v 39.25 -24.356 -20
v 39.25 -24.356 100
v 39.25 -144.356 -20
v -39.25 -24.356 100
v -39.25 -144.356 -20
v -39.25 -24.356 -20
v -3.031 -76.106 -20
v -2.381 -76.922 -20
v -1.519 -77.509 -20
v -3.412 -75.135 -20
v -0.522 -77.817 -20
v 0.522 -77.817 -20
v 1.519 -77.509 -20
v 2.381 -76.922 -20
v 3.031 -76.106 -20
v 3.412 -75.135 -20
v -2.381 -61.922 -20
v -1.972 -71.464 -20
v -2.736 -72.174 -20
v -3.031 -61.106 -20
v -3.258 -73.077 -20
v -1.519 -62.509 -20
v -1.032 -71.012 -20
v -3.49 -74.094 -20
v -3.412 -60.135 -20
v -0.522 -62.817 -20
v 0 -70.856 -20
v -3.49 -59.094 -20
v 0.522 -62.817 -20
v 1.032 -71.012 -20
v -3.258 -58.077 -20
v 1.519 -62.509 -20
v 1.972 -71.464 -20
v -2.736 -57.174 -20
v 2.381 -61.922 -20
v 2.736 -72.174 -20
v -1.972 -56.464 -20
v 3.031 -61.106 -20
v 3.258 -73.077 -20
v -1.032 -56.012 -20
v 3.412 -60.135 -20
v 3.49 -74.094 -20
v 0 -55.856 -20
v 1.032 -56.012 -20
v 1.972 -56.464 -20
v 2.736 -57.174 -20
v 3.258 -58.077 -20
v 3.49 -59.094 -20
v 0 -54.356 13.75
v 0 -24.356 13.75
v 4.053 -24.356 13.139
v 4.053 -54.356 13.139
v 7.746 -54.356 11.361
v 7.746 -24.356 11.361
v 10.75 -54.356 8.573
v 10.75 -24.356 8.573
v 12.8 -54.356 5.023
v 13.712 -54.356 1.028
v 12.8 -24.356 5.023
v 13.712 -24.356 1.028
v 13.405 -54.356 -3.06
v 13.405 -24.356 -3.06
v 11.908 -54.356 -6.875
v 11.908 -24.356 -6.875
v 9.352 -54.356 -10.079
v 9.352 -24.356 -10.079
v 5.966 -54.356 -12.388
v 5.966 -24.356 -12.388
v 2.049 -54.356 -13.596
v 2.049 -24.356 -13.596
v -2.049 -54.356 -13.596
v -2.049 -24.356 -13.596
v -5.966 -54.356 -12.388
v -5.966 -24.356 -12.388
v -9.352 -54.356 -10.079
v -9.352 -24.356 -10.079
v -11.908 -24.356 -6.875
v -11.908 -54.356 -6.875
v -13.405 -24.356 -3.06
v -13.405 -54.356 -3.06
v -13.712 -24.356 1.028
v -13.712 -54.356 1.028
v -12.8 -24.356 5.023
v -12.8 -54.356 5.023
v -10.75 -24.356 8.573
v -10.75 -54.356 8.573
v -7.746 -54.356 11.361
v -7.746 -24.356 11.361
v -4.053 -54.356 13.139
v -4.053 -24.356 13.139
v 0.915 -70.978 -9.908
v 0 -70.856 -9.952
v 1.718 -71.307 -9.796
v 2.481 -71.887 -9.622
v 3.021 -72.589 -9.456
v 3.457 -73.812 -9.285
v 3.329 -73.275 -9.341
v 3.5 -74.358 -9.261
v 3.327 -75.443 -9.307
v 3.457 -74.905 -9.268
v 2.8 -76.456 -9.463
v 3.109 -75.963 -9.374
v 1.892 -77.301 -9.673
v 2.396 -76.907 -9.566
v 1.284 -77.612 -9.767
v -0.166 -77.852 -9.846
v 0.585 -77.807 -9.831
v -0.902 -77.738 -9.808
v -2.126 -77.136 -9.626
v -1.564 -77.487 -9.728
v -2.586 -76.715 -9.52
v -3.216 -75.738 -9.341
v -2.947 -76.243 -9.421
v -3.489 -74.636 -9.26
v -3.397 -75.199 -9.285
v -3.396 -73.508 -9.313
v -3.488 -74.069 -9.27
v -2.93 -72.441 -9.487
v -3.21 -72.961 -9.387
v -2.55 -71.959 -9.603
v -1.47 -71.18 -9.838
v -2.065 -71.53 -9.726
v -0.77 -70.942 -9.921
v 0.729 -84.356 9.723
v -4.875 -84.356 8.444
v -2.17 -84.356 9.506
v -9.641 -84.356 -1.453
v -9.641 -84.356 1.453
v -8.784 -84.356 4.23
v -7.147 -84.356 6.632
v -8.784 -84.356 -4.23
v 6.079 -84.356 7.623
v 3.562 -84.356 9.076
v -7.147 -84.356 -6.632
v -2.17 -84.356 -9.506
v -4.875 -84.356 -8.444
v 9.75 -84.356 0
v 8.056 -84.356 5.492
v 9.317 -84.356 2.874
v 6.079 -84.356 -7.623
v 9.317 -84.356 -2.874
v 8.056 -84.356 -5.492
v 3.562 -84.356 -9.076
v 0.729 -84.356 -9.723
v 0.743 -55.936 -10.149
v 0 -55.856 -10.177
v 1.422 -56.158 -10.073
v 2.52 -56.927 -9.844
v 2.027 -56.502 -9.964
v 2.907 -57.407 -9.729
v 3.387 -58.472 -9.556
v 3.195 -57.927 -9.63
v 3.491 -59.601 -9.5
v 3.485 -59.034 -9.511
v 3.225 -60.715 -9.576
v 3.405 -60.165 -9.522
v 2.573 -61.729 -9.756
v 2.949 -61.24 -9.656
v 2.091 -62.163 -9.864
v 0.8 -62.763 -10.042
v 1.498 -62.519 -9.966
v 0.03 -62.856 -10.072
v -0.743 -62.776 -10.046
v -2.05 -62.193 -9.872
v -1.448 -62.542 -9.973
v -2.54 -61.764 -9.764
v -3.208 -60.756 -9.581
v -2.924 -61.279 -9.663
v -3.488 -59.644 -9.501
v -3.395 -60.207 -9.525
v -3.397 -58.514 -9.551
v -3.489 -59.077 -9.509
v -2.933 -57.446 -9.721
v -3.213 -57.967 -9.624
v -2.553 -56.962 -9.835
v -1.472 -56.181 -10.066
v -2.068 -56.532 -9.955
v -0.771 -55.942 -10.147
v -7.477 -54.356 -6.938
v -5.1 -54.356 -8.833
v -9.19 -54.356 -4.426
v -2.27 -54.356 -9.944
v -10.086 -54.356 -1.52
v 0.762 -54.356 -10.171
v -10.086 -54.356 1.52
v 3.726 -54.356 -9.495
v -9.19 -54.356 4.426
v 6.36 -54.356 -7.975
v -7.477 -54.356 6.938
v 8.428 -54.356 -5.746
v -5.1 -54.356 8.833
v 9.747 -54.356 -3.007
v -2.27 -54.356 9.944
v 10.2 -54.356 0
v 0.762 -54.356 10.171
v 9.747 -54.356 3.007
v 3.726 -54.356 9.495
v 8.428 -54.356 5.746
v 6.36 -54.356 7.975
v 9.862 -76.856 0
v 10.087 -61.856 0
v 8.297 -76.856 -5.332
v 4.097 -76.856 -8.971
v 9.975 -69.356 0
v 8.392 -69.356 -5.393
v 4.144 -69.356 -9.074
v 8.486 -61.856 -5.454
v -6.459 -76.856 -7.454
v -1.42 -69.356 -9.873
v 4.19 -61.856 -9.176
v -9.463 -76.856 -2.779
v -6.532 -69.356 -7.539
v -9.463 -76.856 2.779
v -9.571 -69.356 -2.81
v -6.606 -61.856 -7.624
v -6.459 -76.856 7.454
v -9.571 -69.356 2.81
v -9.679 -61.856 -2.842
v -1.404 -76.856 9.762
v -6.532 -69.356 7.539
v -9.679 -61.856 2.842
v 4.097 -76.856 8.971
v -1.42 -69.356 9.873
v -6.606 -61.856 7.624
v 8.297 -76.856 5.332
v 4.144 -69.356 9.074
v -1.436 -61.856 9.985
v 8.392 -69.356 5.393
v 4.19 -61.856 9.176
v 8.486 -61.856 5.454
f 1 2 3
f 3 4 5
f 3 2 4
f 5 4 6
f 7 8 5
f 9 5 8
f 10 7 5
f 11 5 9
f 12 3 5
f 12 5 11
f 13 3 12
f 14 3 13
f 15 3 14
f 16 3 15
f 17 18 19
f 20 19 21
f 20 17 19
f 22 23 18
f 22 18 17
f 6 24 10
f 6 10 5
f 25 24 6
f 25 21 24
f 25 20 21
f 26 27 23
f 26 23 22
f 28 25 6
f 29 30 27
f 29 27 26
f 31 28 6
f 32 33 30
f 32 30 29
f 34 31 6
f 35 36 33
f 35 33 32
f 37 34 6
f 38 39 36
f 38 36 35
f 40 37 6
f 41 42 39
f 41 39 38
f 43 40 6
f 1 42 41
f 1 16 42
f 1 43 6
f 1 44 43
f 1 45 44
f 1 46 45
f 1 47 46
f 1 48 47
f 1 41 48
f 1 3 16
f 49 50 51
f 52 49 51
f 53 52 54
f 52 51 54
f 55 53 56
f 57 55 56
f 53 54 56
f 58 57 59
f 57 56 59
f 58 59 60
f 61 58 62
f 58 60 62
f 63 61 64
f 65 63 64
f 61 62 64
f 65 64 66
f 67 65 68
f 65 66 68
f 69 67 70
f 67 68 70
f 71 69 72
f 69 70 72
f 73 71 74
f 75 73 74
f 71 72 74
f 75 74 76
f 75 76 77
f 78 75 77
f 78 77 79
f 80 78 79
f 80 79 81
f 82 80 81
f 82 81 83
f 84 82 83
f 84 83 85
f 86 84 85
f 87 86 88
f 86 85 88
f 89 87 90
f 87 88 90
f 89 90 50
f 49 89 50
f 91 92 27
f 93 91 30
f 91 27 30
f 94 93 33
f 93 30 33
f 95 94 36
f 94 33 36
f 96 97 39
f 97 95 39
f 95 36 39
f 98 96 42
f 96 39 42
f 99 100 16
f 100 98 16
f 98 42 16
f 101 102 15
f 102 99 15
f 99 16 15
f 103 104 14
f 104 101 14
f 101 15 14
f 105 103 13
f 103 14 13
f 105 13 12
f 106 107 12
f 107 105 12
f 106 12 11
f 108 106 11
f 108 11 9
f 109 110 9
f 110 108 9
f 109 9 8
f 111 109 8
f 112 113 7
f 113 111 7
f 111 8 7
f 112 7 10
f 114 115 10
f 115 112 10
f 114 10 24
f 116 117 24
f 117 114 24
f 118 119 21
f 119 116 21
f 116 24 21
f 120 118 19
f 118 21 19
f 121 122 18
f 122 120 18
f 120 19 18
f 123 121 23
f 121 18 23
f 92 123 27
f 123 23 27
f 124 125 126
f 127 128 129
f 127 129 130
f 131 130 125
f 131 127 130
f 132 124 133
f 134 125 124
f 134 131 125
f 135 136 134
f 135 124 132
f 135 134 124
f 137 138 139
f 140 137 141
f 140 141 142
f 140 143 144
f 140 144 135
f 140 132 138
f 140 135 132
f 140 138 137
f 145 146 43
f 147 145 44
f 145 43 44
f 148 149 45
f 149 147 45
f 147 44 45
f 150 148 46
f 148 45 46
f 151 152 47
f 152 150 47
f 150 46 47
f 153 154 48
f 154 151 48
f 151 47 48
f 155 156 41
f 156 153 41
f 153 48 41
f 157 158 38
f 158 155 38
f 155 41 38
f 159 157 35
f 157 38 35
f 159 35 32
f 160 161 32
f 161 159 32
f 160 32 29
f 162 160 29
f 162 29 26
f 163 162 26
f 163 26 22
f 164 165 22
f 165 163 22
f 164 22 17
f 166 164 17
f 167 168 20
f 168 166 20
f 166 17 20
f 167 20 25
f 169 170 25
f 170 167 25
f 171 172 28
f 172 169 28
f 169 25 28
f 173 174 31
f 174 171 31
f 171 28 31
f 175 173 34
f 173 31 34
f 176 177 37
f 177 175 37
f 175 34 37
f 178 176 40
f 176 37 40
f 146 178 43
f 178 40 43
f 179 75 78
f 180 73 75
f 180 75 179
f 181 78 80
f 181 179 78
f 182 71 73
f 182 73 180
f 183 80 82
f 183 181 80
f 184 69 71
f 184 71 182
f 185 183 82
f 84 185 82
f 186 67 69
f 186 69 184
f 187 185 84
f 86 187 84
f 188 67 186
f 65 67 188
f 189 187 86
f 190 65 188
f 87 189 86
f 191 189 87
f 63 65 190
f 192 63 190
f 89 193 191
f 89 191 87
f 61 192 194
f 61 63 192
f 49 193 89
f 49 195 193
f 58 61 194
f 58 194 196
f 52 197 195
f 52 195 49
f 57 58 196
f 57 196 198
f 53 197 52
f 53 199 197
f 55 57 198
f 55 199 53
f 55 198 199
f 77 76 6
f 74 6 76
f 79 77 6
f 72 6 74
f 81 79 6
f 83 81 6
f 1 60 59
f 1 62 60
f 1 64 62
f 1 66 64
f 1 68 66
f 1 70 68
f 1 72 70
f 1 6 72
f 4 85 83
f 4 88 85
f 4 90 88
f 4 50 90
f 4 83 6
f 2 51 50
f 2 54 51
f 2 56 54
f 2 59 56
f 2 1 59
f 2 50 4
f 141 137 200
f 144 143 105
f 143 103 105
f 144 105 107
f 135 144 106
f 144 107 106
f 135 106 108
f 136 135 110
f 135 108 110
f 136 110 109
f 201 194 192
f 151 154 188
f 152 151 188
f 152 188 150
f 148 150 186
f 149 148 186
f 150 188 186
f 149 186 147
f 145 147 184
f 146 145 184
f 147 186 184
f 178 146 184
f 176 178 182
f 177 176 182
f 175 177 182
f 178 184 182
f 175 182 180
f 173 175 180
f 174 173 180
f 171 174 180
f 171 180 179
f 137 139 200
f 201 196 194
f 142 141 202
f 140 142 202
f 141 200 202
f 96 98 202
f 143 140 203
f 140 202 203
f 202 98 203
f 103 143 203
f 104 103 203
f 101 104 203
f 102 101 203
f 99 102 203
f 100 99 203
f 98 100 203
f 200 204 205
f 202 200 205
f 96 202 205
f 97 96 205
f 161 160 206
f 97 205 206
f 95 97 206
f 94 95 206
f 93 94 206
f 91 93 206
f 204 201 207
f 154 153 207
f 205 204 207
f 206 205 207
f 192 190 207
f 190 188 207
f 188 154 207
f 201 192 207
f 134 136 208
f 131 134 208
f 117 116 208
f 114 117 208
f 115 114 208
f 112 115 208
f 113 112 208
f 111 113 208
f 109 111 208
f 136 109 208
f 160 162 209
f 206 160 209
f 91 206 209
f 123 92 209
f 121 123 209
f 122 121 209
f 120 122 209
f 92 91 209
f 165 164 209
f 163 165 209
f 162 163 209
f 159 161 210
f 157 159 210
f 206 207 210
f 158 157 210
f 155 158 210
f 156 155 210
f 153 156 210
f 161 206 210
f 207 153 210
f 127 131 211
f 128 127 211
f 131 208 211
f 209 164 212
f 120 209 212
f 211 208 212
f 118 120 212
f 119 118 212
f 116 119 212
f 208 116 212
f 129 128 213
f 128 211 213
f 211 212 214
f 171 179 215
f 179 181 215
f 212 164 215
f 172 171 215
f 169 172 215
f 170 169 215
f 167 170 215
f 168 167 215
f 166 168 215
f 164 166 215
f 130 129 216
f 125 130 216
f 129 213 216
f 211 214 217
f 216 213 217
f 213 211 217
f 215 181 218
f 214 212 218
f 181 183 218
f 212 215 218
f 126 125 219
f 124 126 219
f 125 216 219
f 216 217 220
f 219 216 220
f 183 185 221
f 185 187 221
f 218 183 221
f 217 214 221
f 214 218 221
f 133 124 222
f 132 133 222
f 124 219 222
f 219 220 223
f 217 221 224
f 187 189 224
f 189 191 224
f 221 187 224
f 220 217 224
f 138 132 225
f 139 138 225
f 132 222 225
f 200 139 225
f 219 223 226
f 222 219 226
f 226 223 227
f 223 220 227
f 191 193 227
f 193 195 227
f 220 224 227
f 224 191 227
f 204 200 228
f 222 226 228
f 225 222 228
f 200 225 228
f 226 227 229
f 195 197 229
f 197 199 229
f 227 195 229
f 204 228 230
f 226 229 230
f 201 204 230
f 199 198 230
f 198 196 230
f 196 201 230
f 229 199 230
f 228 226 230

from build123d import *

# Parameters (mm, degrees)
BOSS_EXTRUDE1_DEPTH = 39.25
SKETCH4_R           = 13.75
CUT_EXTRUDE1_DEPTH  = 30
SKETCH7_R           = 9.75
SKETCH6_R           = 10.2
SKETCH5_R           = 3.5
CUT_EXTRUDE2_DEPTH  = 15


with BuildPart() as part:
    # Sketch2 → Boss-Extrude1 (new, symmetric)
    with BuildSketch(Plane(origin=(0, 0, 0), x_dir=(0, 0, -1), z_dir=(1, 0, 0))):
        Polygon((-100, -24.35604681), (20, -144.35604681), (20, -24.35604681), align=None)
    extrude(amount=BOSS_EXTRUDE1_DEPTH, both=True)

    # Sketch4 → Cut-Extrude1 (cut)
    with BuildSketch(Plane(origin=(0, -24.35604681, 0), x_dir=(1, 0, 0), z_dir=(0, 1, 0))):
        with Locations(Location((0, 0, 0), (0, 0, 270))):
            Circle(SKETCH4_R)
    extrude(amount=-CUT_EXTRUDE1_DEPTH, mode=Mode.SUBTRACT)

    # Sketch7 → Cut-Loft1 section 0
    with BuildSketch(Plane(origin=(0, -84.35604681, 0), x_dir=(1, 0, 0), z_dir=(0, 1, 0))):
        Circle(SKETCH7_R)
    # Sketch6 → Cut-Loft1 section 1
    with BuildSketch(Plane(origin=(0, -54.35604681, 0), x_dir=(1, 0, 0), z_dir=(0, 1, 0))):
        Circle(SKETCH6_R)
    loft(mode=Mode.SUBTRACT)

    # Sketch5 → Cut-Extrude2 (cut)
    with BuildSketch(Plane(origin=(0, 0, -20), x_dir=(-1, 0, 0), z_dir=(0, 0, -1))):
        with Locations(Location((0, -59.35604681, 0), (0, 0, 90))):
            Circle(SKETCH5_R)
        with Locations(Location((0, -74.35604681, 0), (0, 0, 90))):
            Circle(SKETCH5_R)
    extrude(amount=-CUT_EXTRUDE2_DEPTH, mode=Mode.SUBTRACT)


solid = part.part
